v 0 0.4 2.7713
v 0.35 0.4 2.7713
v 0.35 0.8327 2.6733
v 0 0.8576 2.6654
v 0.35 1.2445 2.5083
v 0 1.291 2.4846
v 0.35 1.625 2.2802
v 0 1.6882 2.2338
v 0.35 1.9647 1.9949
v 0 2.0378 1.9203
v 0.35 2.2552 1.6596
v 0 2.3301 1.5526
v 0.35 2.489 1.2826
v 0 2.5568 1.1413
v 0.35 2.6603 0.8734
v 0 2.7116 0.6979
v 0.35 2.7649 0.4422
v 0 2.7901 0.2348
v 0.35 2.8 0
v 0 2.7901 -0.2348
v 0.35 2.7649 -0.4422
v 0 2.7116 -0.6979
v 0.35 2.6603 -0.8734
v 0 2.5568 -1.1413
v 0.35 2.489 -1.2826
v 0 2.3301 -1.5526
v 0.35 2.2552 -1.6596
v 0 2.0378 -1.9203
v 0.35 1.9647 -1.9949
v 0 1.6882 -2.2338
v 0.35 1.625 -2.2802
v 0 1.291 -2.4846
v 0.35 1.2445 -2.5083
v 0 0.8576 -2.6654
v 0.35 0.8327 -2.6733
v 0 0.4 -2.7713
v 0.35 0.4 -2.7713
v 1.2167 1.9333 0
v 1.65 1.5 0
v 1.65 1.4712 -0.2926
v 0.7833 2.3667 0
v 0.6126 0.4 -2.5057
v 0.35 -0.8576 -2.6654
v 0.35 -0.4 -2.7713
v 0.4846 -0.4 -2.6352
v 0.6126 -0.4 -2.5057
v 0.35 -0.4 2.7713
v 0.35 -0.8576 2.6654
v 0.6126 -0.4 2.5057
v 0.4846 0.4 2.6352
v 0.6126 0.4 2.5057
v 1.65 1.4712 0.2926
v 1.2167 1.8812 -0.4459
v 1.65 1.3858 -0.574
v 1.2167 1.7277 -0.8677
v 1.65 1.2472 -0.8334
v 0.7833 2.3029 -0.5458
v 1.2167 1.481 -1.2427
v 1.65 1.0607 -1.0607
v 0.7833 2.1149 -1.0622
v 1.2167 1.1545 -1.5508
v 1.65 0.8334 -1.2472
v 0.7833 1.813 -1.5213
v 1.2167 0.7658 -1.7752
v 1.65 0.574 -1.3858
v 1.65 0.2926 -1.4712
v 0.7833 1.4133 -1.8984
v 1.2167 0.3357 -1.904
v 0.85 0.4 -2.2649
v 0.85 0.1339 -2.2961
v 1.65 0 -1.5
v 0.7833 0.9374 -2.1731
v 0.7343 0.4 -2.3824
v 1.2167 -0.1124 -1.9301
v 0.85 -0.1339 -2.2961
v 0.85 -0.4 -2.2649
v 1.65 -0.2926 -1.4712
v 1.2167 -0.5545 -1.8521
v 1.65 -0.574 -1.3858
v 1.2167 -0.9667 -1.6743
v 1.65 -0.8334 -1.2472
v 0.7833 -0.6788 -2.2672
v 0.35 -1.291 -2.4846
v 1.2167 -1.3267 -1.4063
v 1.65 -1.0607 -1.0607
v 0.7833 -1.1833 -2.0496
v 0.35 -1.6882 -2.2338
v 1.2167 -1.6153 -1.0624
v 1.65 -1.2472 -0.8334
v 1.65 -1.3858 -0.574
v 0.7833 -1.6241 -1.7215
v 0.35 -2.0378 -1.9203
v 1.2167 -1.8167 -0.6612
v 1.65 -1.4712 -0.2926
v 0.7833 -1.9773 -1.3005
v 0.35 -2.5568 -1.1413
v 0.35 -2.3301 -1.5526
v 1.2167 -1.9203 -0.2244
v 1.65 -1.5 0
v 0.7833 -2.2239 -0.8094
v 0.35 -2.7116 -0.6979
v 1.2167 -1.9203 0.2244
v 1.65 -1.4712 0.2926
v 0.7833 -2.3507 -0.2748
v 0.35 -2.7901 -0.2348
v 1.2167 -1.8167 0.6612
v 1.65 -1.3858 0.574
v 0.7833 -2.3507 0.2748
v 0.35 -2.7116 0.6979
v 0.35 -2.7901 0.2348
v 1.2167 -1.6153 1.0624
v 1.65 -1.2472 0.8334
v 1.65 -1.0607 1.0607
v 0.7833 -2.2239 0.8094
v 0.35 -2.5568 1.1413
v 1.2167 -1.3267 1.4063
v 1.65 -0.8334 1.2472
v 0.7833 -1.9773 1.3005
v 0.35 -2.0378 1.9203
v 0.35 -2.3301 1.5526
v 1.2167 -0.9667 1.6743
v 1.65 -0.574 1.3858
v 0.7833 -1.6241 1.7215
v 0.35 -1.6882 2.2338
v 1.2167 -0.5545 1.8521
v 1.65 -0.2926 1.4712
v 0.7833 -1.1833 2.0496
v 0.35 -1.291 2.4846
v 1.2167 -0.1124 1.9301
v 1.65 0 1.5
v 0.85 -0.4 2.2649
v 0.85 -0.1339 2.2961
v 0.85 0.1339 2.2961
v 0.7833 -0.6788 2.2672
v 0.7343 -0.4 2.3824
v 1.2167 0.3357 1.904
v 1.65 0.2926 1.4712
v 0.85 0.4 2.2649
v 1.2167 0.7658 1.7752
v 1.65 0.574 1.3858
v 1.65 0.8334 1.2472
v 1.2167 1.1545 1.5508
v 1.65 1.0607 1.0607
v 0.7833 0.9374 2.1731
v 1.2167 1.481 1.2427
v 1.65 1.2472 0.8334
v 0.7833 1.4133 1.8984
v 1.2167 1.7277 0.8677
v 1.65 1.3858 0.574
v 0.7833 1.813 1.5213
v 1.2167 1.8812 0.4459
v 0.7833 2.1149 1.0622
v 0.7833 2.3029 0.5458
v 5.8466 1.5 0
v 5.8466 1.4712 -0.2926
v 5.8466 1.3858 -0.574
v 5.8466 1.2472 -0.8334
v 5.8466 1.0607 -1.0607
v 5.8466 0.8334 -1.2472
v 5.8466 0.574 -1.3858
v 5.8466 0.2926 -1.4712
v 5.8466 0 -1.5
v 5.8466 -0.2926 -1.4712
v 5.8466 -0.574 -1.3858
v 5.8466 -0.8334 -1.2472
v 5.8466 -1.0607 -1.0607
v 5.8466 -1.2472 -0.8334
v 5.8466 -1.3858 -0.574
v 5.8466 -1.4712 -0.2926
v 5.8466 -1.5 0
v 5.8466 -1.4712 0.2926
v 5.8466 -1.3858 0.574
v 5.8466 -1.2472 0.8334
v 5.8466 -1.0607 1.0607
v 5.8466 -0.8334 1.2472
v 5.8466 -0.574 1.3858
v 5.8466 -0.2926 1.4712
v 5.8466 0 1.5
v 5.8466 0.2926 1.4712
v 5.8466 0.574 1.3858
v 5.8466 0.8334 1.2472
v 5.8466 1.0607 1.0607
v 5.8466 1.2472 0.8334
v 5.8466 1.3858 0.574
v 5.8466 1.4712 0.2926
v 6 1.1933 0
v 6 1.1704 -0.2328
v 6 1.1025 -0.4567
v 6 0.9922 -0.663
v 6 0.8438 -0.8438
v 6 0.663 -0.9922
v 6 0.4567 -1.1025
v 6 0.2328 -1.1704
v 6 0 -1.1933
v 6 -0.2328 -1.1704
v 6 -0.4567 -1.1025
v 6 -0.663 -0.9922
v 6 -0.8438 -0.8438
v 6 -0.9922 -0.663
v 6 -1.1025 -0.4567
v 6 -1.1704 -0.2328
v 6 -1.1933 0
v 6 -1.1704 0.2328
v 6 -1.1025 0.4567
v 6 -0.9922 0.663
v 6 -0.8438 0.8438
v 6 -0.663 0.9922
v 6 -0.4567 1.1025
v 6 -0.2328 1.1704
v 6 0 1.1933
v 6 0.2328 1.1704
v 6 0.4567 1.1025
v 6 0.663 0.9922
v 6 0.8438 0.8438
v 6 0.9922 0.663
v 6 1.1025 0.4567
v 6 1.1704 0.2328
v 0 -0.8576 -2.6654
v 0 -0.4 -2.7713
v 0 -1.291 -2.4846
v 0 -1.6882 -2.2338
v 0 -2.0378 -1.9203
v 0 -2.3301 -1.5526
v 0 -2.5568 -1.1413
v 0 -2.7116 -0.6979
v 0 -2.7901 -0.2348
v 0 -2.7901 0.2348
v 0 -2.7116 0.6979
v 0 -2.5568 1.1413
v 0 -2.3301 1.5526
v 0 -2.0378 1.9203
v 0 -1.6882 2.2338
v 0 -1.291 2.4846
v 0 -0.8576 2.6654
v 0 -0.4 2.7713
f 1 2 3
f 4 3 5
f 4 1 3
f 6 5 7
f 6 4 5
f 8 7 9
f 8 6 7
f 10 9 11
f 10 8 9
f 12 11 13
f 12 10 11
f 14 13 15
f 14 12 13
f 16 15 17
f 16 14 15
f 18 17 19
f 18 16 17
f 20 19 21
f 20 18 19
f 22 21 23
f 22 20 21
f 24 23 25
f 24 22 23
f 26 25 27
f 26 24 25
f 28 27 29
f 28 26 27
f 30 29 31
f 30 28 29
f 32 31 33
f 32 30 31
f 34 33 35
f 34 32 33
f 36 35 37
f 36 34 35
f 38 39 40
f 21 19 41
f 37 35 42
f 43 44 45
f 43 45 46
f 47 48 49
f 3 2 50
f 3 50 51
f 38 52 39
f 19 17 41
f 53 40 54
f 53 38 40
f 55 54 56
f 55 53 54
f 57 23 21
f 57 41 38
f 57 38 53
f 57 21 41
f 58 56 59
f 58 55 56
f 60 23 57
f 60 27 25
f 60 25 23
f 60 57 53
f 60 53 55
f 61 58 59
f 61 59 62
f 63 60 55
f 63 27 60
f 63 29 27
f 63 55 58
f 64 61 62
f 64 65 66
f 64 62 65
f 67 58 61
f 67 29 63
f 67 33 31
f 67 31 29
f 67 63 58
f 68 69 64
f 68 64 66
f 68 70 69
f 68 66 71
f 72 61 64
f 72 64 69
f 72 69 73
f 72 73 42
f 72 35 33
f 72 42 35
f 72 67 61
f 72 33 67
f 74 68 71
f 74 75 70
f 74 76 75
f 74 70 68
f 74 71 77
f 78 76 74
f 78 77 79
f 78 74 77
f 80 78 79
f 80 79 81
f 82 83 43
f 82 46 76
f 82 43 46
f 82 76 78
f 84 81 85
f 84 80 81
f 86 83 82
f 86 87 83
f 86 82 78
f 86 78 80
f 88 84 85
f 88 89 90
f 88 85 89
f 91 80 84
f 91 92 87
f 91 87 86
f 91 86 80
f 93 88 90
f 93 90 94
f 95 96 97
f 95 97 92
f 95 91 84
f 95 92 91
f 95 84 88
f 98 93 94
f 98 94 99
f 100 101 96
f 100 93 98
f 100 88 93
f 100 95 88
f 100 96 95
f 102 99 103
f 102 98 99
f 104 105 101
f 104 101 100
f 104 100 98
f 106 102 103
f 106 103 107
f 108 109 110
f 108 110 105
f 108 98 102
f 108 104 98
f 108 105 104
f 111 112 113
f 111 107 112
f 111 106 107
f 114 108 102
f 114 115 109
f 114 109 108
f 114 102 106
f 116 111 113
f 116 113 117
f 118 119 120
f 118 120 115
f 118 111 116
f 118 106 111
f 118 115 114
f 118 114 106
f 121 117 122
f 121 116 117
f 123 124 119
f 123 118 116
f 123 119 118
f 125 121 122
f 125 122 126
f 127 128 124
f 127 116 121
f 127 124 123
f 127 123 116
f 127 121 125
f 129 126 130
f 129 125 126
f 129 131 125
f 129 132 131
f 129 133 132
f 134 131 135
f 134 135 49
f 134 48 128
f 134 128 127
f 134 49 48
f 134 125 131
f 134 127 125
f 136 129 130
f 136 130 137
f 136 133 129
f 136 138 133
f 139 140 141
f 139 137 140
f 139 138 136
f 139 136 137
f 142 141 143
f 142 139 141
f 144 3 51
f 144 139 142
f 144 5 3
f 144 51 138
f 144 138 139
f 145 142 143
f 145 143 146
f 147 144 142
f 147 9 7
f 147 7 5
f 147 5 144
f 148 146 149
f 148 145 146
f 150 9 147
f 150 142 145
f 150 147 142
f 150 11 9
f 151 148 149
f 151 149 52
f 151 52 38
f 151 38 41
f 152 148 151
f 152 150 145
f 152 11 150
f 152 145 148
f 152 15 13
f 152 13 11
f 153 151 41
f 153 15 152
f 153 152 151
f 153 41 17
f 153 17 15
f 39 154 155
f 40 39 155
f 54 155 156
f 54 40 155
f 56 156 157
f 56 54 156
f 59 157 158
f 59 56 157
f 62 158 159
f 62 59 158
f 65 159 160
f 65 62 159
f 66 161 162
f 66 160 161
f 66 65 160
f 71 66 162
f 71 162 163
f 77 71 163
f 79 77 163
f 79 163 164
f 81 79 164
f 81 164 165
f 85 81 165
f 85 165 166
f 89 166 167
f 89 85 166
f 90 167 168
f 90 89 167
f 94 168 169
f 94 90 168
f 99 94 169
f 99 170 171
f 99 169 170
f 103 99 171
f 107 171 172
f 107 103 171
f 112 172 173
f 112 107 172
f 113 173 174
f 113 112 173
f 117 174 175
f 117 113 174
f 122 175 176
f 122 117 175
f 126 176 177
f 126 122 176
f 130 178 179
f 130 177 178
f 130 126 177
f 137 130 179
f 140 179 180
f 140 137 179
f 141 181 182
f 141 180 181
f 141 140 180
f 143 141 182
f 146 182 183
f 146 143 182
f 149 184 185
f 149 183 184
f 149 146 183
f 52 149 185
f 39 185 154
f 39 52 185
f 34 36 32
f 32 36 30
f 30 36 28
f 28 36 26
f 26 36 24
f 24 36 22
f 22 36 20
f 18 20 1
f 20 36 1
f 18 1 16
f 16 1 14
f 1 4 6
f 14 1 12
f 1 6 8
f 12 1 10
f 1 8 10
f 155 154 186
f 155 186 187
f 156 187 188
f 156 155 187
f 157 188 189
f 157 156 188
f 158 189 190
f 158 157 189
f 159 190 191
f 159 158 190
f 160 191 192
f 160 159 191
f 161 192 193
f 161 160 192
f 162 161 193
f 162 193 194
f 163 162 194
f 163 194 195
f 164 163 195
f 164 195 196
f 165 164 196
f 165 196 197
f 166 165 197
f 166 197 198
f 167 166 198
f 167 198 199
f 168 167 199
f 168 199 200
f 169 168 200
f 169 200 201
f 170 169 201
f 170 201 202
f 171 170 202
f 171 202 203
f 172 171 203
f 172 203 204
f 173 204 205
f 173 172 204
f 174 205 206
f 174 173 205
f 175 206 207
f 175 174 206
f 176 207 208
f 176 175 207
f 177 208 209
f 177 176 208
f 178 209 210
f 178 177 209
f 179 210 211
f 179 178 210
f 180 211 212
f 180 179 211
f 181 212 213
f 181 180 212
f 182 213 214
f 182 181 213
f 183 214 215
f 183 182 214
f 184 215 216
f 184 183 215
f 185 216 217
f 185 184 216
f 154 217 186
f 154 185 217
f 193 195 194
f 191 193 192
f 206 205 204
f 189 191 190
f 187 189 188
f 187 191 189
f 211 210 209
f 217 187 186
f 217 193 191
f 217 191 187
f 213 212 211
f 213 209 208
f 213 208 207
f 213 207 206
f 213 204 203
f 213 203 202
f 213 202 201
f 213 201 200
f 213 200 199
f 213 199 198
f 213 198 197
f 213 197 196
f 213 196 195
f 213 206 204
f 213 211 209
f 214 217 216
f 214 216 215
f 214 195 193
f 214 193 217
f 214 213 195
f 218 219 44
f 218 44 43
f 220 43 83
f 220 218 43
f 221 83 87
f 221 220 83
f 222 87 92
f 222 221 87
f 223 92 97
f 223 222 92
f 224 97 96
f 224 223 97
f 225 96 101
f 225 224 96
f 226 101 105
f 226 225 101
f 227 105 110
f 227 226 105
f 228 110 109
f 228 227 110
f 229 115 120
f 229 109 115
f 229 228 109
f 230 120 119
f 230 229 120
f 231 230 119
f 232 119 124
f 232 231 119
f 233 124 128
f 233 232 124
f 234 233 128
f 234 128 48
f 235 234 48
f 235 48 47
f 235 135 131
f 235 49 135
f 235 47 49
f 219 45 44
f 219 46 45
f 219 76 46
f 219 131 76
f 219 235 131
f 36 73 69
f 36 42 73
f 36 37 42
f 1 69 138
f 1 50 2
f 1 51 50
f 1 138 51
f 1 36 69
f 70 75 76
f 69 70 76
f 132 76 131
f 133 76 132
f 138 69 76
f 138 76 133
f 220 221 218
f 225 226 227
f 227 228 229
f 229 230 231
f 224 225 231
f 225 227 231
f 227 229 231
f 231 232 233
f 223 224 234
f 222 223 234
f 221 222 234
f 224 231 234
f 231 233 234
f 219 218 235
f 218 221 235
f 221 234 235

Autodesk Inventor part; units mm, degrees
ref_plane "YZ Plane" through (0, 0, 0) normal (1, 0, 0) x (0, 1, 0)
ref_plane "XZ Plane" through (0, 0, 0) normal (0, 1, 0) x (-1, 0, 0)
sketch "Skizze1" plane through (0, 0, 0) normal (0, 0, 1) x (1, 0, 0)
  line L0 (0, 0) -> (6, 0)
  line L1 (6, 0) -> (6, 1.5)
  line L2 (6, 1.5) -> (2.65, 1.5)
  line L3 (2.65, 1.5) -> (2.3433, 1.5)
  line L4 (2.3433, 1.5) -> (1.65, 1.5)
  line L5 (1.65, 1.5) -> (0.35, 2.8)
  line L6 (0.35, 2.8) -> (0, 2.8)
  line L7 (0, 2.8) -> (0, 0)
  line L8 (2.65, 1.5) -> (1.65, 1.5) construction
  line L9 (-1.2, 0) -> (7.2, 0) projected
  line L10 (0, 3.36) -> (0, -0.56) projected
  dimension "d0" = 6
  dimension "d1" = 45
  dimension "d2" = 0.3067
  dimension "d3" = 3.35
  dimension "d4" = 1.65
  dimension "d5" = 3
  dimension "d6" = 3
  dimension "d7" = 5.6
revolve "Körper" add sketch "Skizze1" angle 360 about axis through (0, 0, 0) along (1, 0, 0)
sketch "Skizze2" plane through (0, 0, 0) normal (-1, 0, 0) x (0, 0, 1)
  line L0 (2.8, -0.4) -> (-2.8, -0.4)
  line L1 (-2.8, -0.4) -> (-2.8, 0.4)
  line L2 (-2.8, 0.4) -> (2.8, 0.4)
  line L3 (2.8, 0.4) -> (2.8, -0.4)
  line L4 (0, 0.4) -> (0, -0.4) construction
  line L5 (-2.8, 0) -> (2.8, 0) construction
  line L6 (0, 2.8) -> (0, 0) projected
  dimension "d15" = 0.8
  dimension "d16" = 5.6
extrude "Loch" cut sketch "Skizze2" against normal blind 0.85
thread "Gewinde" size "M3x0.5" class "6g" standard "ISO Metric profile" length 3.35
chamfer "Fase1" distance 0.3067 distance2 0.1534 1 edges at (6, -1.5, 0) measured on face at (6, -0.5112, 0.3316)
ref_plane "Work Plane1" through (33.575, 0, 0) normal (0, 0, -1) x (1, 0, 0)
equation "\"d1\" = 0.5 * SEWI"
equation "\"d2\" = GAL"
equation "\"d4\" = KOH"
equation "\"d5\" = BDM"
equation "\"d6\" = GD"
equation "\"d7\" = KOD"
equation "\"d15\" = SBR"
equation "\"d16\" = KOD"
equation "\"d8\" = STI"
equation "\"d12\" = -0.5 * SPD + 0.5 * GD"
equation "\"d13\" = 0.5 * GAL"
equation "\"NLG\" = 4"
equation "\"GAL\" = 0.61345 * PTC"
equation "\"GEL\" = 1.35"
equation "\"KOH\" = 1.65"
equation "\"KOD\" = 5.6"
equation "\"SEWI\" = 90deg"
equation "\"BDM\" = NND"
equation "\"GD\" = NND"
equation "\"SBR\" = 0.8"
equation "\"STI\" = 0.85"
equation "\"SPD\" = NND - 1.2269 * PTC"
equation "\"GUL\" = 0.61345 * PTC"
equation "\"PTC\" = 0.5"
equation "\"EPV\" = 3.15"
equation "\"THREADDIA\" = 3"
equation "\"TOA\" = 30deg"
equation "\"NND\" = 3"
equation "\"GD1\" = THREADDIA - 1.2269 * PTC"
properties part number "DIN 963 - M3 x 4" material "Edelstahl"
